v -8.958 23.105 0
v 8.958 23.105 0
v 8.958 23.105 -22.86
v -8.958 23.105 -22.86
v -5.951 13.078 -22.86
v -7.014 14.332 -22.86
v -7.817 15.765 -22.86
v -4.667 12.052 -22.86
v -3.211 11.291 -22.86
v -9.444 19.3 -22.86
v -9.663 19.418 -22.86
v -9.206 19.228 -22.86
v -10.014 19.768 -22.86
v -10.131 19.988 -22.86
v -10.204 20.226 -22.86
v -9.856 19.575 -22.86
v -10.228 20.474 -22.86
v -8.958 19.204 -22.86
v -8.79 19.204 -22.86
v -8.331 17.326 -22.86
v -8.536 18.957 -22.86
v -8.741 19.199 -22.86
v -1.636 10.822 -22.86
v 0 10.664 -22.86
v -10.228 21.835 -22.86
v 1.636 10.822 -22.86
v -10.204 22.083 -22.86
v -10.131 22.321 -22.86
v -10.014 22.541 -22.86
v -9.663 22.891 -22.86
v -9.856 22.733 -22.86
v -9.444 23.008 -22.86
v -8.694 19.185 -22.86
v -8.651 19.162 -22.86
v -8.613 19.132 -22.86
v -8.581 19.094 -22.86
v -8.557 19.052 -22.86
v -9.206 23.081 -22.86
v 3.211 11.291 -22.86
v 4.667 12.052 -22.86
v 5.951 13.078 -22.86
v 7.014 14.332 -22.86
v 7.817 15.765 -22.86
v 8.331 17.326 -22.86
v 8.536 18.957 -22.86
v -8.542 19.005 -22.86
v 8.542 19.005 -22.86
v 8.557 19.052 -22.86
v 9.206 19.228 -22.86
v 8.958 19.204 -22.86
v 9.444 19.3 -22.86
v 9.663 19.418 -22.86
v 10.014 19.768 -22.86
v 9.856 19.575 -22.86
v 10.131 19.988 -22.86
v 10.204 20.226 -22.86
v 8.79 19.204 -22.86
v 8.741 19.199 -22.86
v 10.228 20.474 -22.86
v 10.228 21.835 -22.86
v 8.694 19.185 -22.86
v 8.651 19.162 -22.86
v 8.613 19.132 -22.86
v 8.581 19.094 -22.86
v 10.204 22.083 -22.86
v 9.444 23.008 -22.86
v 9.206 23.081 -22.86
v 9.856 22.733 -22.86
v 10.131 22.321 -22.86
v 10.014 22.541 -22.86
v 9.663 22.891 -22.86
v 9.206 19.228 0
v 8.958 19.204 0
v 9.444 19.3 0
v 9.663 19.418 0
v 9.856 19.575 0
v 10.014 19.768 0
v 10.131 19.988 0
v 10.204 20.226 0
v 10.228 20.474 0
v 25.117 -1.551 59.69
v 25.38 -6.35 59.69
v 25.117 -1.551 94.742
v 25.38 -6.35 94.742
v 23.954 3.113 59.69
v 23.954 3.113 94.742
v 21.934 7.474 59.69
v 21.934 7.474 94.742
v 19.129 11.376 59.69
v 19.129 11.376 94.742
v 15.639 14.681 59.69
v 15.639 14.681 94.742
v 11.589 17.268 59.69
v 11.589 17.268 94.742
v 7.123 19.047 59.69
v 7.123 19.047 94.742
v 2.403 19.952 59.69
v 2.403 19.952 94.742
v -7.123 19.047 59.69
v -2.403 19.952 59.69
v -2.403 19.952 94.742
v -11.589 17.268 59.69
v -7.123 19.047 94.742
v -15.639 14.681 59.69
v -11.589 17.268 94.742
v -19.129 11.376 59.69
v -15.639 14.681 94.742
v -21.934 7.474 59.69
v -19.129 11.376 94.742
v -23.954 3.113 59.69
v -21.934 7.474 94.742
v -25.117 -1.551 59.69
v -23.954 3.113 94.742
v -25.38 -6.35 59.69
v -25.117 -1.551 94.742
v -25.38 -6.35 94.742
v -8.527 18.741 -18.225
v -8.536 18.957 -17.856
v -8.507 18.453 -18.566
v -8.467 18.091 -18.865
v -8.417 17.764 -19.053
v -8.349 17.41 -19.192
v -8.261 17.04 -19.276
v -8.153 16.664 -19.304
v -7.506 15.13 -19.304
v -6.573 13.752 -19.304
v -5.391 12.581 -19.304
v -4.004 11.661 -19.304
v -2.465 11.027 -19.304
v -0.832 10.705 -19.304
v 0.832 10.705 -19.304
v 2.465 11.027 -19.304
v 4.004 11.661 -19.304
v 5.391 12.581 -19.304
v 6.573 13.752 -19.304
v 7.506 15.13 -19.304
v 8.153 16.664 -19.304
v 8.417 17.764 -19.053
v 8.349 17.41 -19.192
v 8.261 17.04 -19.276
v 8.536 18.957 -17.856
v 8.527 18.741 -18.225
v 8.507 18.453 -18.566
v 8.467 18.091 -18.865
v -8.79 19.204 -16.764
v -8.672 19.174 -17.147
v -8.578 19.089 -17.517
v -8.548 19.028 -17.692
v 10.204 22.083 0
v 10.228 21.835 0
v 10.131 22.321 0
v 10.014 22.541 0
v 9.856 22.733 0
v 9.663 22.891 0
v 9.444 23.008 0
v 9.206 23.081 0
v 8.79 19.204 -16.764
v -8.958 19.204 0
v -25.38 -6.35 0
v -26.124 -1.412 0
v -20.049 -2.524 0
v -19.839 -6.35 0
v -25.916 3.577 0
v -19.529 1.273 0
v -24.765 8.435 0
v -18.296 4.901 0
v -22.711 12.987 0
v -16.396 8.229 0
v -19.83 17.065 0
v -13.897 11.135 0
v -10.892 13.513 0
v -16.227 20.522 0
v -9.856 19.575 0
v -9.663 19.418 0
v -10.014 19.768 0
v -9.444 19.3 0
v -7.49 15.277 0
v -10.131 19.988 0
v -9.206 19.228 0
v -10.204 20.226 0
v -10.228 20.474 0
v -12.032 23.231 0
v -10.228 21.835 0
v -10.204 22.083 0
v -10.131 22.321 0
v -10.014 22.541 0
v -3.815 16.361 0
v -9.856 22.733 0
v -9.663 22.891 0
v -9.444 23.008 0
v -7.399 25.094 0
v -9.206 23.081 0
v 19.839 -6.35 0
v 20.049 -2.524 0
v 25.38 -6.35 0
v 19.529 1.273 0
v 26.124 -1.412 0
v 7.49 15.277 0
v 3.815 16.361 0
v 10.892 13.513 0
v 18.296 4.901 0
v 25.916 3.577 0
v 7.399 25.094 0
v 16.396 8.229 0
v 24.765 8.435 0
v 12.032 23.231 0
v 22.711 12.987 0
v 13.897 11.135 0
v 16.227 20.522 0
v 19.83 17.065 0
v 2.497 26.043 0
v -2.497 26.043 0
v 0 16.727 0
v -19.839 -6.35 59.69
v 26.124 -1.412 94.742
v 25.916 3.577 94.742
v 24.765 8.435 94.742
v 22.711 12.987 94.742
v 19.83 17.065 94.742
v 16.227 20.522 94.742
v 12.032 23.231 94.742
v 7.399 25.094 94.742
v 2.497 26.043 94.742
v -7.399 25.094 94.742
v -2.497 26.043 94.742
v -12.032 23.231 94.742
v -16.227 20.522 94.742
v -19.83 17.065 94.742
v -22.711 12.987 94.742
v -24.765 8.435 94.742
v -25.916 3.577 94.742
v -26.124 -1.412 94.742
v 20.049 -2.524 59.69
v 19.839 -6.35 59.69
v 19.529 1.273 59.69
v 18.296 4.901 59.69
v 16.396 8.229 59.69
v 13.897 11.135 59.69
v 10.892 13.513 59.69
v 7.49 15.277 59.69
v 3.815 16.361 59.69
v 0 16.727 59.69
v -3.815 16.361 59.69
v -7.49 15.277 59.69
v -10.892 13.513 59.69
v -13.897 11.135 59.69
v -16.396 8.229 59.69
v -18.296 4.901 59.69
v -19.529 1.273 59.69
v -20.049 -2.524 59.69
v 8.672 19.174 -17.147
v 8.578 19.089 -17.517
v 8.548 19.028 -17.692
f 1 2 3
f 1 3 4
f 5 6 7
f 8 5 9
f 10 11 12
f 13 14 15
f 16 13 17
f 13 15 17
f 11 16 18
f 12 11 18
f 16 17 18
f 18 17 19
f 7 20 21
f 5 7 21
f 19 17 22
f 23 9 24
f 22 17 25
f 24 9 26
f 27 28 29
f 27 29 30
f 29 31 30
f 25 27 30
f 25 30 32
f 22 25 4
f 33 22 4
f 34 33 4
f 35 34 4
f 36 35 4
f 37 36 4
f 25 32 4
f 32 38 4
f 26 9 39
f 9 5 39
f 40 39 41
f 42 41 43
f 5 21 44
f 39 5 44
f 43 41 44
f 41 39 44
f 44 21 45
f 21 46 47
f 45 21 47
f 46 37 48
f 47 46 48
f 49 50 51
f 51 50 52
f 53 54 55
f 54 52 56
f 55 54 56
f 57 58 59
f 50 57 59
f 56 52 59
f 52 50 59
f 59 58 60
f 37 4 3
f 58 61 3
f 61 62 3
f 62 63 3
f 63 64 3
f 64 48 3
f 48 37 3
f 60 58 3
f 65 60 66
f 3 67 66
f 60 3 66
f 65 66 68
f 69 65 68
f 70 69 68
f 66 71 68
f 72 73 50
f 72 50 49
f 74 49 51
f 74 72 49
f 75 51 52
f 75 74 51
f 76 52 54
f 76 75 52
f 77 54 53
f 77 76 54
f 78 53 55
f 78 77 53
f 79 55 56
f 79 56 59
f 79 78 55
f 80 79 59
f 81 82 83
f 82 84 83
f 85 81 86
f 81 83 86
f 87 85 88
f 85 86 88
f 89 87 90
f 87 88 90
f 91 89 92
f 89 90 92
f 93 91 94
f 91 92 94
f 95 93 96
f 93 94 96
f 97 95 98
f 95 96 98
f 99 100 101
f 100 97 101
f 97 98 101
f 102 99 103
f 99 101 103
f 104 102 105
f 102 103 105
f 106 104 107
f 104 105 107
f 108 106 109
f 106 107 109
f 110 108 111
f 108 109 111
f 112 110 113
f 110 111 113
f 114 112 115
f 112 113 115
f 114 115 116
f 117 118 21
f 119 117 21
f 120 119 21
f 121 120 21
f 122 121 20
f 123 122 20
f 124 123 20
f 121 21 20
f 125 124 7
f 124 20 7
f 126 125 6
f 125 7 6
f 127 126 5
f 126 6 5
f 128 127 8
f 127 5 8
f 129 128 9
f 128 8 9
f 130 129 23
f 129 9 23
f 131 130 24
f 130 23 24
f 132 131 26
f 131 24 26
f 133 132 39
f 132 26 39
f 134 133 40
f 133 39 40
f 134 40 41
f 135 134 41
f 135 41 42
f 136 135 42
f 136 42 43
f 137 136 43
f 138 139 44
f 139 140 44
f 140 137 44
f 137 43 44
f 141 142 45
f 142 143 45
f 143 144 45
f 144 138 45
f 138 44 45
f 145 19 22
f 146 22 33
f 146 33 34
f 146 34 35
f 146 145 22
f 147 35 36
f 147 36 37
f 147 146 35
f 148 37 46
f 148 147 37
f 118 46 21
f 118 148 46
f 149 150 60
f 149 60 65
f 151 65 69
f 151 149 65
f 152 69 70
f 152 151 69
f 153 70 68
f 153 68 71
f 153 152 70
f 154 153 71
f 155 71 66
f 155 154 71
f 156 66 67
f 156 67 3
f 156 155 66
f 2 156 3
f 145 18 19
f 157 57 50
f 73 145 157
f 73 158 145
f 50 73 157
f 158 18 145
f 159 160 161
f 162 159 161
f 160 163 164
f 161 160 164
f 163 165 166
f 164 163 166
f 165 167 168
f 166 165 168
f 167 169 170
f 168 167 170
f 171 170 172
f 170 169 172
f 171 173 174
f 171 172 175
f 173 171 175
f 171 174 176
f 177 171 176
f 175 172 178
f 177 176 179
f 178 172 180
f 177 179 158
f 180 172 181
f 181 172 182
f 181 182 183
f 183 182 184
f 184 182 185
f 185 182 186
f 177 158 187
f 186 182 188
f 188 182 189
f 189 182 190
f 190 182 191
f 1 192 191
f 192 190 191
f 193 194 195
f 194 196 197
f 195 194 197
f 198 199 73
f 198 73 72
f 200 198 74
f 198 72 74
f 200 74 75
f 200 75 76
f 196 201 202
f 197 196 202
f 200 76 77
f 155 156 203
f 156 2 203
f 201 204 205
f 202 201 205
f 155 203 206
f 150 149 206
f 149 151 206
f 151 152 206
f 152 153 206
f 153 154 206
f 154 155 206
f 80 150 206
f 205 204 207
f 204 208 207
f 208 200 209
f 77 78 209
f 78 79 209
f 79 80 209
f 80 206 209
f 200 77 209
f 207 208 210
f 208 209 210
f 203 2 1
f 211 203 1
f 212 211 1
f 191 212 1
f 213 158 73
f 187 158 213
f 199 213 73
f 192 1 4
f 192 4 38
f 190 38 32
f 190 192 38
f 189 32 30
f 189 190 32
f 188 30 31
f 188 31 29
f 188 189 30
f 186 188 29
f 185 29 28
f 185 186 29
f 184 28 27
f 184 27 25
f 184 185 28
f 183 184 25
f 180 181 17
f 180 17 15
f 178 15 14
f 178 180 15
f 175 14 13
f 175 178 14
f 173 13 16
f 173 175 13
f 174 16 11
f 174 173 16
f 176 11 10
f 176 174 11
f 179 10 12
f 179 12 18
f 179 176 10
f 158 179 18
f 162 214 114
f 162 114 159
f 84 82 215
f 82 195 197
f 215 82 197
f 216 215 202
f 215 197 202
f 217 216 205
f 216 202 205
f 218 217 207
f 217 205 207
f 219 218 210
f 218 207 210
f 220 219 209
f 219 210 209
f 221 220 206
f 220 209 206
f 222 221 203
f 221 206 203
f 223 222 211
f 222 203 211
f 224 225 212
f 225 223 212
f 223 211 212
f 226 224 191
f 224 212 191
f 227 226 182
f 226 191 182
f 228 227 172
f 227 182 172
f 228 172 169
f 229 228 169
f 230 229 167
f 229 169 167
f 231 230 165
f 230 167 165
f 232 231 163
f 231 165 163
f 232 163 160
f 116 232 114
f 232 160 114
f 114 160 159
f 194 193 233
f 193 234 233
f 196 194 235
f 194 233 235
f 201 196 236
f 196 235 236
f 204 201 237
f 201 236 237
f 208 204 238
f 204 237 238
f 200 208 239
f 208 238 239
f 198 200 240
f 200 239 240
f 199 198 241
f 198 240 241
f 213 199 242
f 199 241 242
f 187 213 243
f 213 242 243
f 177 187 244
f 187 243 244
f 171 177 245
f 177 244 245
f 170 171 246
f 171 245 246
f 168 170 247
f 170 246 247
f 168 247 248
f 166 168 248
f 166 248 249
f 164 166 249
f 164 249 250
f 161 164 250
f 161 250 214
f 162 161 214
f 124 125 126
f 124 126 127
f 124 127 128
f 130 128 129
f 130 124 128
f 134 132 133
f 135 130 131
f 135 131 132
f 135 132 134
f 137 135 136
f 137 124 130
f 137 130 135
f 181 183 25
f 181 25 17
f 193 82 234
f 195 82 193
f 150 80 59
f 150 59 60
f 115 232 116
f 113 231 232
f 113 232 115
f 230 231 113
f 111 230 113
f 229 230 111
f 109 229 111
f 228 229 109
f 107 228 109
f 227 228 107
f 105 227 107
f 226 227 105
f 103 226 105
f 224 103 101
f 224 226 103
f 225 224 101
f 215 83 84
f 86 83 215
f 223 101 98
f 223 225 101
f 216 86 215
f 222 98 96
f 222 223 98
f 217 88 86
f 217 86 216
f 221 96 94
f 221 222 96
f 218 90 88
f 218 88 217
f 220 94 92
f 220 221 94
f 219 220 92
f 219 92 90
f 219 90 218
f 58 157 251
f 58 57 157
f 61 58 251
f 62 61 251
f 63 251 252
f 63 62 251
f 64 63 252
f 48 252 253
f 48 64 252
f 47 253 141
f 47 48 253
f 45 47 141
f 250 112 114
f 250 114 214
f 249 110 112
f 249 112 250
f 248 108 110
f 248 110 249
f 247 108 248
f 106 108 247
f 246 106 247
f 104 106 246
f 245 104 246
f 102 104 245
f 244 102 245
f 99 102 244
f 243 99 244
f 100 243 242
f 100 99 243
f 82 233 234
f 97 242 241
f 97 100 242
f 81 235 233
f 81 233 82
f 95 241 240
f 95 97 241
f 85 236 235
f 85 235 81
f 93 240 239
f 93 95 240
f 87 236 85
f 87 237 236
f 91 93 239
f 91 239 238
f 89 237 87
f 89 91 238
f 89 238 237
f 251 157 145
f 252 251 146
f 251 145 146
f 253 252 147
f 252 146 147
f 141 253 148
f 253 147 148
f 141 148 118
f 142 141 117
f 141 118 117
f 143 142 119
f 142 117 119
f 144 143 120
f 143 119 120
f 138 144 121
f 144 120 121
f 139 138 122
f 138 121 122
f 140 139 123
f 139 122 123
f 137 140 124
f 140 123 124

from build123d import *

# Parameters (mm, degrees)
SKETCH1_R           = 26.162
BOSS_EXTRUDE1_DEPTH = 94.742
SKETCH2_R           = 25.4
CUT_EXTRUDE1_DEPTH  = 35.052
SKETCH3_R           = 20.066
CUT_EXTRUDE2_DEPTH  = 134.62
SKETCH6_W           = 64.219899477
SKETCH6_H           = 22.849587553
CUT_EXTRUDE4_DEPTH  = 33.909
BOSS_EXTRUDE3_DEPTH = 22.86
BOSS_EXTRUDE4_DEPTH = 3.556
FILLET3_R           = 2.54
FILLET4_R           = 0.254


with BuildPart() as part:
    # Sketch1 → Boss-Extrude1 (new body)
    with BuildSketch(Plane.XY):
        Circle(SKETCH1_R)
    extrude(amount=BOSS_EXTRUDE1_DEPTH)

    # Sketch2 → Cut-Extrude1 (cut)
    with BuildSketch(Plane.XY.offset(94.742)):
        with Locations((0, -5.334)):
            Circle(SKETCH2_R)
    extrude(amount=-CUT_EXTRUDE1_DEPTH, mode=Mode.SUBTRACT)

    # Sketch3 → Cut-Extrude2 (cut)
    with BuildSketch(Plane.XY.offset(59.69)):
        with Locations((0, -3.339145452)):
            Circle(SKETCH3_R)
    extrude(amount=-CUT_EXTRUDE2_DEPTH, mode=Mode.SUBTRACT)

    # Sketch6 → Cut-Extrude4 (cut, symmetric)
    with BuildSketch(Plane(origin=(0, 0, 0), x_dir=(0, 0, -1), z_dir=(1, 0, 0))):
        with Locations((-27.580050262, -17.774793777)):
            Rectangle(SKETCH6_W, SKETCH6_H)
    extrude(amount=CUT_EXTRUDE4_DEPTH, both=True, mode=Mode.SUBTRACT)

    # Sketch11 → Boss-Extrude3 (add)
    with BuildSketch(Plane(origin=(0, 0, 0), x_dir=(-1, 0, 0), z_dir=(0, 0, -1))):
        with BuildLine():
            Line((-8.957907595, 23.105072639), (8.957907595, 23.105072639))
            ThreePointArc((8.957907595, 23.105072639), (9.855933208, 22.733098251), (10.227907595, 21.835072639))
            Line((10.227907595, 21.835072639), (10.227907595, 20.473507992))
            ThreePointArc((10.227907595, 20.473507992), (9.855933208, 19.57548238), (8.957907595, 19.203507992))
            Line((8.957907595, 19.203507992), (-8.957907595, 19.203507992))
            ThreePointArc((-8.957907595, 19.203507992), (-9.855933208, 19.57548238), (-10.227907595, 20.473507992))
            Line((-10.227907595, 20.473507992), (-10.227907595, 21.835072639))
            ThreePointArc((-10.227907595, 21.835072639), (-9.855933208, 22.733098251), (-8.957907595, 23.105072639))
        make_face()
    extrude(amount=BOSS_EXTRUDE3_DEPTH)

    # Sketch12 → Boss-Extrude4 (add)
    with BuildSketch(Plane(origin=(0, 0, -22.86), x_dir=(-1, 0, 0), z_dir=(0, 0, -1))):
        with BuildLine():
            Line((-8.539617395, 19.203507992), (8.539617395, 19.203507992))
            ThreePointArc((8.539617395, 19.203507992), (0, 10.663890596), (-8.539617395, 19.203507992))
        make_face()
    extrude(amount=-BOSS_EXTRUDE4_DEPTH)

    # Fillet3
    fillet3_edges = [part.edges().sort_by_distance(p)[0] for p in [
        (0, 19.203507992, -19.304),
    ]]
    fillet(fillet3_edges, radius=FILLET3_R)

    # Fillet4
    fillet4_edges = [part.edges().sort_by_distance(p)[0] for p in [
        (8.539617395, 19.203507992, -19.812),
        (-8.539617395, 19.203507992, -19.812),
    ]]
    fillet(fillet4_edges, radius=FILLET4_R)


solid = part.part
